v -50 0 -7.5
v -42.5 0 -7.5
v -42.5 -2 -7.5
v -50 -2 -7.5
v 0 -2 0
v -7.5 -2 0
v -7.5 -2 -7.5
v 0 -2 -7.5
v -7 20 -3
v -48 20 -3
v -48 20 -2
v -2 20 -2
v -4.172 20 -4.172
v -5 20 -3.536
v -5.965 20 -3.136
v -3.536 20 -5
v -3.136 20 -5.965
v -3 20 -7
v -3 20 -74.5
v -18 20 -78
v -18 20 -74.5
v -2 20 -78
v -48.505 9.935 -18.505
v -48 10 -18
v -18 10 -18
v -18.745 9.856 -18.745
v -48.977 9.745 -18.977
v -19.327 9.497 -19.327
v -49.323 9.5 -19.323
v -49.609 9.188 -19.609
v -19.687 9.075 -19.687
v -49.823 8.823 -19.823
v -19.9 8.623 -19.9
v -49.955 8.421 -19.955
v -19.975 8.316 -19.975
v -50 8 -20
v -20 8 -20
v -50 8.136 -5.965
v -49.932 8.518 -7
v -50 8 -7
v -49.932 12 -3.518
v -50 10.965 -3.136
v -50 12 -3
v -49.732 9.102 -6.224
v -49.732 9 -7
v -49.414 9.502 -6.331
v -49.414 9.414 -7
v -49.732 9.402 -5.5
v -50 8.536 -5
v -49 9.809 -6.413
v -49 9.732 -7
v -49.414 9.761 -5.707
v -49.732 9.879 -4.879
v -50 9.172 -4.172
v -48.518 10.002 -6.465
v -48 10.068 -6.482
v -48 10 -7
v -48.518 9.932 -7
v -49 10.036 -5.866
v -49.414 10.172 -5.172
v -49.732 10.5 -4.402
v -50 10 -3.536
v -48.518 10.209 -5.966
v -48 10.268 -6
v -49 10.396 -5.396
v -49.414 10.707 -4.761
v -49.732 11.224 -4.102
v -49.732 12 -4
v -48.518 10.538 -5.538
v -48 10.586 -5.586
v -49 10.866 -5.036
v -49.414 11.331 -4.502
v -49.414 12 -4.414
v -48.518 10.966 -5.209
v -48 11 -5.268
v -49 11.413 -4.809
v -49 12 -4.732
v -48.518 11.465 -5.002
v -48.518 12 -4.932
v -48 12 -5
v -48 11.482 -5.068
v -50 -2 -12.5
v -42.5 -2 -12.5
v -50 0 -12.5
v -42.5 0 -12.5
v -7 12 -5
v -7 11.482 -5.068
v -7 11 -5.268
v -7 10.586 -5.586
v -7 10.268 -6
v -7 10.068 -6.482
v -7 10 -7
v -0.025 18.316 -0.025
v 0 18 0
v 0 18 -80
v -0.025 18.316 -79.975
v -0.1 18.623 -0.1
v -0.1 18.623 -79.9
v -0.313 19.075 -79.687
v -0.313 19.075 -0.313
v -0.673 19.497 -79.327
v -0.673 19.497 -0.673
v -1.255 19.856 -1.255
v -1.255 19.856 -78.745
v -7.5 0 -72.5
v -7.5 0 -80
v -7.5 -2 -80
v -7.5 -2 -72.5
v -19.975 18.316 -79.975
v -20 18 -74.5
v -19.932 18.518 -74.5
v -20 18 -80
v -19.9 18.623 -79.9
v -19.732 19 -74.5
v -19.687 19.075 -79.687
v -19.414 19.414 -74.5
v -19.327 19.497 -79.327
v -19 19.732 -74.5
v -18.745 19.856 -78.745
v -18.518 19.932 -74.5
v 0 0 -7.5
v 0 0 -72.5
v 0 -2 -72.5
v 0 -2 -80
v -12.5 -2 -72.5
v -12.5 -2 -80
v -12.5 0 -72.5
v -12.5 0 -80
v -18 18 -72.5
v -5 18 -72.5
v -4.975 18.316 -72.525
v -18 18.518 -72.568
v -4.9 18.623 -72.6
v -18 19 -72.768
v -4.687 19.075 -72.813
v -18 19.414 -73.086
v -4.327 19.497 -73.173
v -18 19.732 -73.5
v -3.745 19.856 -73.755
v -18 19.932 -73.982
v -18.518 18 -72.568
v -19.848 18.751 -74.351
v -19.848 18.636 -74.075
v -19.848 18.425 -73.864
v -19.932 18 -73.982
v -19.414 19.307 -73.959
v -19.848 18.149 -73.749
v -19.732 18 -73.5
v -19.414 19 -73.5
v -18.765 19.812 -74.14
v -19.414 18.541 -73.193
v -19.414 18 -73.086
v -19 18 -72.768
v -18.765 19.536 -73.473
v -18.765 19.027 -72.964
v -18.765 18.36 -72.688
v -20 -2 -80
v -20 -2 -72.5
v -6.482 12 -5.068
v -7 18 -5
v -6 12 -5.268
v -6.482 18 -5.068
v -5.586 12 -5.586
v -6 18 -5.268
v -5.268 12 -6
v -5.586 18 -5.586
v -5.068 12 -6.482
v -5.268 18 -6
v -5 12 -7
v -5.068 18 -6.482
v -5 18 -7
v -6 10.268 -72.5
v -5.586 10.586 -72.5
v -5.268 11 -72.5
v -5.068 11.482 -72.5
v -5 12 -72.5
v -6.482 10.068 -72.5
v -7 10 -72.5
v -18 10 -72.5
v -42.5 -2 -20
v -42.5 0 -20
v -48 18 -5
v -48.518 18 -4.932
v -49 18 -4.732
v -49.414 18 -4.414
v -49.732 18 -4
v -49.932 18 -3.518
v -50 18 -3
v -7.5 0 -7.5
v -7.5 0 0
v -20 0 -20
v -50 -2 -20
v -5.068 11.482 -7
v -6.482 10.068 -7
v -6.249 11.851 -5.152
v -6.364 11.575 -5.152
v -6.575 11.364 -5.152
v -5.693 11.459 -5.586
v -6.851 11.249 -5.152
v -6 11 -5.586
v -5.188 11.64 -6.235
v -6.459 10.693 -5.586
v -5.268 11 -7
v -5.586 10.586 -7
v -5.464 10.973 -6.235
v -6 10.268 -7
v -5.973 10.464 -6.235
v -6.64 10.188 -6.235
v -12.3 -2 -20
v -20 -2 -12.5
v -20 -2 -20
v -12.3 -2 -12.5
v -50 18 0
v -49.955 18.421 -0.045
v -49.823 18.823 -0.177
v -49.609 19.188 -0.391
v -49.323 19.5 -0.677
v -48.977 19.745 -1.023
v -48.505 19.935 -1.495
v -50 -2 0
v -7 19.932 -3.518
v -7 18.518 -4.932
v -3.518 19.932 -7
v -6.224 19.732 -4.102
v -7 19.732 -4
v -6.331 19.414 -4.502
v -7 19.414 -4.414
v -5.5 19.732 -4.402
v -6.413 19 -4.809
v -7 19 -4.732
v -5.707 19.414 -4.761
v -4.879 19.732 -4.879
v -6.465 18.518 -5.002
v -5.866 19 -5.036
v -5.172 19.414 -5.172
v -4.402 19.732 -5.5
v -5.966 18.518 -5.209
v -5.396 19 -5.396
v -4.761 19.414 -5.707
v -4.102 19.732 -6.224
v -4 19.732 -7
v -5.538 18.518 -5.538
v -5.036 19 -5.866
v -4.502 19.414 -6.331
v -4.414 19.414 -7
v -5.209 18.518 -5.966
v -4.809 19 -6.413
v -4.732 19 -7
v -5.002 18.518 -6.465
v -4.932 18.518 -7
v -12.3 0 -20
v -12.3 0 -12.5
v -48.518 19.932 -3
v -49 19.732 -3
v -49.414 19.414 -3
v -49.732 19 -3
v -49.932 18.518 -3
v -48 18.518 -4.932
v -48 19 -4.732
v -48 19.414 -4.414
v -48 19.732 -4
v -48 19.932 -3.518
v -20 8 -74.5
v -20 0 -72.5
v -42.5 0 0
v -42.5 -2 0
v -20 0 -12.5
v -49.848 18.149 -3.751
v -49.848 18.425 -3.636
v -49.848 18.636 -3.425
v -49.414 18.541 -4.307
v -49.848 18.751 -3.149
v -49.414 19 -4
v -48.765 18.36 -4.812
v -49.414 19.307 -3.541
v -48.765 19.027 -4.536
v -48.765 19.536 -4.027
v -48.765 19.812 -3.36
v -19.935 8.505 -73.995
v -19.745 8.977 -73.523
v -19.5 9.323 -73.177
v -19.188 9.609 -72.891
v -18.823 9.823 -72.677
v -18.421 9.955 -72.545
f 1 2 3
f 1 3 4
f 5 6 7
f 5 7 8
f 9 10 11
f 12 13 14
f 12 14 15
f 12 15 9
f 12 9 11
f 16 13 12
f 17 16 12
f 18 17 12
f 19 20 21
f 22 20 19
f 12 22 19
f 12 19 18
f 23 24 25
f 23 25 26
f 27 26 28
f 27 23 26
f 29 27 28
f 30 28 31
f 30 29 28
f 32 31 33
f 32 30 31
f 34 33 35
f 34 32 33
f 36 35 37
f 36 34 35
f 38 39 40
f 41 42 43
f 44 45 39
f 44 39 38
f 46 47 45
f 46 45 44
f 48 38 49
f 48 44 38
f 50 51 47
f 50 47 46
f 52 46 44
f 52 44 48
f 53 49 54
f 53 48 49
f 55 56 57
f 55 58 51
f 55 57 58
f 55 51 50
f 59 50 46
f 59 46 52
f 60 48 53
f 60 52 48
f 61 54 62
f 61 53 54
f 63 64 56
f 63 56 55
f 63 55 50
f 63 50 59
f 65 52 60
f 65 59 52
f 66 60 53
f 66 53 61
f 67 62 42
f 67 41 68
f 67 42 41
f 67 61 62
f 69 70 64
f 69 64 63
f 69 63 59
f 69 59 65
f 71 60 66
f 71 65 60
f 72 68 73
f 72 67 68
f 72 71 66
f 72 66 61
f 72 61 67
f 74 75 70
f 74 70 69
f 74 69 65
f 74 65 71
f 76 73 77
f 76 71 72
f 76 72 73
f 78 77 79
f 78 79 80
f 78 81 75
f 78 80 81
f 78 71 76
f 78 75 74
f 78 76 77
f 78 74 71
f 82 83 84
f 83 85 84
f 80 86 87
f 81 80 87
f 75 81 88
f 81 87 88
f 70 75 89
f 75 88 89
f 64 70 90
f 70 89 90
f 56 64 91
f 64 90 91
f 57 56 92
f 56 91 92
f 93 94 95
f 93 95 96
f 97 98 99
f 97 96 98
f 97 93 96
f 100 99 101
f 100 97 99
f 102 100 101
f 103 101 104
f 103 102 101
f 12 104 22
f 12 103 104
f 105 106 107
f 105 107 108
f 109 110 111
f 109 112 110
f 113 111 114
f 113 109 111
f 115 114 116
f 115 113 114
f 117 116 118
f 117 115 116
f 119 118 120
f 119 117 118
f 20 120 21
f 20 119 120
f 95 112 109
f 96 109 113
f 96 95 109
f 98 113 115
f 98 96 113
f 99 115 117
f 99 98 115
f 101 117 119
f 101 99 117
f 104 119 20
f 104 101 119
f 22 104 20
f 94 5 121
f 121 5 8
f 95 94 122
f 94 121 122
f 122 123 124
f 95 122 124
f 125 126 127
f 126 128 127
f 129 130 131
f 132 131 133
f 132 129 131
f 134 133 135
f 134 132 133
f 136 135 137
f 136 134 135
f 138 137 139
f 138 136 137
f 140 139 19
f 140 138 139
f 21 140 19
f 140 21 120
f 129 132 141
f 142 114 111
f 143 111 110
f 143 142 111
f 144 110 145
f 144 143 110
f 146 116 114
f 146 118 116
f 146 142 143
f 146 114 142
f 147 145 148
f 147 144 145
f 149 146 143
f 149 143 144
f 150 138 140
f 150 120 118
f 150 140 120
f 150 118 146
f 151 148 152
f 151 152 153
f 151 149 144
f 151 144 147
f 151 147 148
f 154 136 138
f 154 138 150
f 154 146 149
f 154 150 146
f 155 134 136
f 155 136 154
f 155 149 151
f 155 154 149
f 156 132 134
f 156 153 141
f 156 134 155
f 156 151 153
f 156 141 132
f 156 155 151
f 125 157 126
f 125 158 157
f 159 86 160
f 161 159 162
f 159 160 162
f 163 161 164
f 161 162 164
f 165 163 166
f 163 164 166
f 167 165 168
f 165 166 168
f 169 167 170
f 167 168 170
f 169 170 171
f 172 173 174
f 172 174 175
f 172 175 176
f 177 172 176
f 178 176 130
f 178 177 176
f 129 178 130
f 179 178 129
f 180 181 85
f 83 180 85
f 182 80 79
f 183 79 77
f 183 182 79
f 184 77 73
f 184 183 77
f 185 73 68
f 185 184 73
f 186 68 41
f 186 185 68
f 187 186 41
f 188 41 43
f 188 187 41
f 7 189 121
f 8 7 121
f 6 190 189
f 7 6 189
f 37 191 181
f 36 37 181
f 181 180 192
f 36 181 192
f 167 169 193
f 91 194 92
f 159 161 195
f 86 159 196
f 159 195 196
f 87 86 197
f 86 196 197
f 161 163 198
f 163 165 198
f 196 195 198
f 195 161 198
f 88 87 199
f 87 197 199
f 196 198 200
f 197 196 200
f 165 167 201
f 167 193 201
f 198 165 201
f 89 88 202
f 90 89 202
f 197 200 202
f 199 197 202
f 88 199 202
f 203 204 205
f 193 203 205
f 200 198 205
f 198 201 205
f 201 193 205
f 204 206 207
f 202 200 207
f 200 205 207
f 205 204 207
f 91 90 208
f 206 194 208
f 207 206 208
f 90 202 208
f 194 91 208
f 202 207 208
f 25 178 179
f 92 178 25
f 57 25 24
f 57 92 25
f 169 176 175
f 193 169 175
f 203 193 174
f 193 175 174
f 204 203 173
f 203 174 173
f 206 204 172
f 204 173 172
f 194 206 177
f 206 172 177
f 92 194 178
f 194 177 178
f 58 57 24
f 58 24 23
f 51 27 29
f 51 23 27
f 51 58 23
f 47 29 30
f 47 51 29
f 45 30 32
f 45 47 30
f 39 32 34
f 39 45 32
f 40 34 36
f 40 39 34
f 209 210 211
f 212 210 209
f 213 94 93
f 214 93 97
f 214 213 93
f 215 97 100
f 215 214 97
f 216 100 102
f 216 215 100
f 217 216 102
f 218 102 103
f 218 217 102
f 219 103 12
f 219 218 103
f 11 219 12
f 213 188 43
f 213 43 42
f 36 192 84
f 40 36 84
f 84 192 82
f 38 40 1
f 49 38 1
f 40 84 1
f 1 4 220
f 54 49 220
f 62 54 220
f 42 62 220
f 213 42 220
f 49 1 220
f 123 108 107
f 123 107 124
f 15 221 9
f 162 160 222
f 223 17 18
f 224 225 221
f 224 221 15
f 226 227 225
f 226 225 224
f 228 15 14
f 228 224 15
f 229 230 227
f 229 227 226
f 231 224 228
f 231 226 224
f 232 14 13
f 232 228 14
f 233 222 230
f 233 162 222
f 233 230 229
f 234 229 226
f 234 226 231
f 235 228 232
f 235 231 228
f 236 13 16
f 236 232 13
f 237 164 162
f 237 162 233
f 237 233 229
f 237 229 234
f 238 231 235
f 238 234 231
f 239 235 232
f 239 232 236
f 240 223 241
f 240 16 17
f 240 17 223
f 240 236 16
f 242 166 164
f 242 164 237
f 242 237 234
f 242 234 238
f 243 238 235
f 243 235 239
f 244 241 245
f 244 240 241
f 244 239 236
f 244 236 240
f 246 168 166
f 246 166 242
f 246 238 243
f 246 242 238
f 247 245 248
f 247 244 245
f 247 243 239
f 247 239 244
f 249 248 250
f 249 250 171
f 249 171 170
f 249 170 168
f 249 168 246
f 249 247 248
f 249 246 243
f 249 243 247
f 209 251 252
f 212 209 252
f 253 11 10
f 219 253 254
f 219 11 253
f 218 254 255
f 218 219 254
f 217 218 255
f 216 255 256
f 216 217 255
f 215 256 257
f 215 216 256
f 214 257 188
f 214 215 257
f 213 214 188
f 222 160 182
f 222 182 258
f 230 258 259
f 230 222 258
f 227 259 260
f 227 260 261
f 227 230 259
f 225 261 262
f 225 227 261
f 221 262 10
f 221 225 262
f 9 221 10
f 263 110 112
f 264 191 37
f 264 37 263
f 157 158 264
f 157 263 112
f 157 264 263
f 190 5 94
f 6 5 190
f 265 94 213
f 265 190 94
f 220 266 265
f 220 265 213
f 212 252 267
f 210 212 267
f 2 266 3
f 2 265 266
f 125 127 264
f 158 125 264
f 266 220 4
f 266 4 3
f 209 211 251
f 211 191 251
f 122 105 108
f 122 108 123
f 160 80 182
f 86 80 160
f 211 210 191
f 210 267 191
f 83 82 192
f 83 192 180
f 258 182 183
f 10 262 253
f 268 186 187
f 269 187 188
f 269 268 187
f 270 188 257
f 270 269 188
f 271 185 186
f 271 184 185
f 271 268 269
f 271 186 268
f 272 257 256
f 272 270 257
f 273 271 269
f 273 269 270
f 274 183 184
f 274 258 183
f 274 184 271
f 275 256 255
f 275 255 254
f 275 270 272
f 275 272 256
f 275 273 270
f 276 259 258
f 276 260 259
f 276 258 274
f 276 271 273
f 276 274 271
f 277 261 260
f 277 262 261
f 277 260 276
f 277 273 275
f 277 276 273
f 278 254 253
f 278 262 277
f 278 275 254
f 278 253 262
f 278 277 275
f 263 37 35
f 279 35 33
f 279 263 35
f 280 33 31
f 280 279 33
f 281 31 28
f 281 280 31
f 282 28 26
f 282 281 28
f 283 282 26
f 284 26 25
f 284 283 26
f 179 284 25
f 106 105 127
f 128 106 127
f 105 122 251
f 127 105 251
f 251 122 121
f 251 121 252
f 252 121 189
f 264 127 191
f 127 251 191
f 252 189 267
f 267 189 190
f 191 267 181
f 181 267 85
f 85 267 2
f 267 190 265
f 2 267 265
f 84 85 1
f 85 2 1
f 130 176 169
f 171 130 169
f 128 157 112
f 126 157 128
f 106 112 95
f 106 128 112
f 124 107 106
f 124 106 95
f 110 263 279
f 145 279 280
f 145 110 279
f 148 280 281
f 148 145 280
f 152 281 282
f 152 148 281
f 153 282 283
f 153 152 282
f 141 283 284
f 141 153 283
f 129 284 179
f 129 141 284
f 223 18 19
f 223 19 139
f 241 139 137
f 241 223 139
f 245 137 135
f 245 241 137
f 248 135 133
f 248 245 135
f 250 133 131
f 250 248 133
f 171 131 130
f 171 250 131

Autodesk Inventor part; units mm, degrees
ref_plane "YZ Plane" through (0, 0, 0) normal (1, 0, 0) x (0, 1, 0)
ref_plane "XZ Plane" through (0, 0, 0) normal (0, 1, 0) x (-1, 0, 0)
ref_plane "XY Plane" through (0, 0, 0) normal (0, 0, 1) x (1, 0, 0)
sketch "Sketch1" plane through (0, 0, 0) normal (0, 1, 0) x (-1, 0, 0)
  line L0 (50, 0) -> (0, 0)
  line L1 (0, 0) -> (0, -20)
  line L2 (0, -20) -> (50, -20)
  line L3 (50, -20) -> (50, 0)
  line L4 (0, 0) -> (20, 0)
  line L5 (20, 0) -> (20, -80)
  line L6 (20, -80) -> (0, -80)
  line L7 (0, -80) -> (0, 0)
  point P0 (0, 0)
  point P1 (20, -20)
  dimension "d0" = 50
  dimension "d1" = 20
  dimension "d2" = 80
  dimension "d3" = 20
  dimension "d4" = 0
  dimension "d5" = 0
extrude "Extrusion1" add sketch "Sketch1" along normal blind 10
sketch "Sketch3" plane through (0, 10, 0) normal (0, 1, 0) x (1, 0, 0)
  line L0 (0, 80) -> (-20, 80) projected
  line L1 (-20, 80) -> (0, 80)
  line L2 (0, 80) -> (0, 72.5)
  line L3 (0, 72.5) -> (-20, 72.5)
  line L4 (-20, 72.5) -> (-20, 80)
  line L5 (0, 0) -> (0, 80) projected
  line L6 (0, 80) -> (-5, 80)
  line L7 (-5, 80) -> (-5, 0)
  line L8 (-5, 0) -> (0, 0)
  line L9 (0, 0) -> (0, 80)
  line L10 (-50, 20) -> (-50, 0) projected
  line L11 (0, 0) -> (-50, 0)
  line L12 (0, 10) -> (0, 0)
  line L13 (-50, 0) -> (0, 0) projected
  line L14 (0, 0) -> (-50, 0)
  line L15 (-50, 0) -> (-50, 5)
  line L16 (-50, 5) -> (0, 5)
  line L17 (0, 5) -> (0, 0)
  point P0 (-50, 10)
  point P1 (-5, 72.5)
  point P2 (-5, 5)
  point P3 (-5, 0)
  dimension "d8" = 20
  dimension "d9" = 7.5
  dimension "d10" = 5
  dimension "d11" = 80
  dimension "d14" = 50
  dimension "d15" = 5
extrude "Extrusion2" add sketch "Sketch3" along normal blind 10 contours L2 L3 L7 L0 | L7 L3 L4 L0 | L5 L16 L7 L3 | L16 L5 L8 L7
extrude "Extrusion3" add sketch "Sketch3" along normal blind 10 contours L7 L11 L10 L16
fillet "Fillet1" radius 2 16 edges at (-5, 20, -38.75) (-5, 10, -38.75) (-27.5, 20, -5) (-27.5, 10, -5) (-5, 15, -5) (-20, 10, -46.25) (-35, 10, -20) (-12.5, 20, -72.5) (-10, 20, -80) (-20, 20, -76.25) (-20, 15, -72.5) (-50, 10, -12.5) (-50, 15, -5) (-50, 20, -2.5) (0, 20, -40) (-25, 20, 0)
sketch "Sketch4" plane through (0, 0, 0) normal (0, -1, 0) x (1, 0, 0)
  line L0 (0, 0) -> (-7.5, 0)
  line L1 (-7.5, 0) -> (-7.5, -7.5)
  line L2 (-7.5, -7.5) -> (0, -7.5)
  line L3 (0, -7.5) -> (0, 0)
  line L4 (-20, -20) -> (-50, -20) projected
  line L5 (-50, -20) -> (-42.5, -20)
  line L6 (-42.5, -20) -> (-42.5, -12.5)
  line L7 (-42.5, -12.5) -> (-50, -12.5)
  line L8 (-50, -12.5) -> (-50, -20)
  line L9 (-50, 0) -> (0, 0) projected
  line L10 (-50, 0) -> (-42.5, 0)
  line L11 (-42.5, 0) -> (-42.5, -7.5)
  line L12 (-42.5, -7.5) -> (-50, -7.5)
  line L13 (-50, -7.5) -> (-50, 0)
  line L14 (-18, -18) -> (-20, -20) projected
  line L15 (-20, -20) -> (-12.3, -20)
  line L16 (-12.3, -20) -> (-12.3, -12.5)
  line L17 (-12.3, -12.5) -> (-20, -12.5)
  line L18 (-20, -12.5) -> (-20, -20)
  line L19 (0, -80) -> (-20, -80) projected
  line L20 (-20, -80) -> (-12.5, -80)
  line L21 (-12.5, -80) -> (-12.5, -72.5)
  line L22 (-12.5, -72.5) -> (-20, -72.5)
  line L23 (-20, -72.5) -> (-20, -80)
  line L24 (0, 0) -> (0, -80) projected
  line L25 (0, -80) -> (-7.5, -80)
  line L26 (-7.5, -80) -> (-7.5, -72.5)
  line L27 (-7.5, -72.5) -> (0, -72.5)
  line L28 (0, -72.5) -> (0, -80)
  point P0 (0, -72.5)
  dimension "d19" = 7.5
  dimension "d20" = 7.5
  dimension "d21" = 7.5
  dimension "d22" = 7.5
  dimension "d23" = 7.5
  dimension "d24" = 7.5
  dimension "d25" = 7.7
  dimension "d26" = 7.5
  dimension "d27" = 7.5
  dimension "d28" = 7.5
  dimension "d29" = 7.5
  dimension "d30" = 7.5
extrude "Extrusion4" add sketch "Sketch4" along normal blind 2
properties part number "couch"
